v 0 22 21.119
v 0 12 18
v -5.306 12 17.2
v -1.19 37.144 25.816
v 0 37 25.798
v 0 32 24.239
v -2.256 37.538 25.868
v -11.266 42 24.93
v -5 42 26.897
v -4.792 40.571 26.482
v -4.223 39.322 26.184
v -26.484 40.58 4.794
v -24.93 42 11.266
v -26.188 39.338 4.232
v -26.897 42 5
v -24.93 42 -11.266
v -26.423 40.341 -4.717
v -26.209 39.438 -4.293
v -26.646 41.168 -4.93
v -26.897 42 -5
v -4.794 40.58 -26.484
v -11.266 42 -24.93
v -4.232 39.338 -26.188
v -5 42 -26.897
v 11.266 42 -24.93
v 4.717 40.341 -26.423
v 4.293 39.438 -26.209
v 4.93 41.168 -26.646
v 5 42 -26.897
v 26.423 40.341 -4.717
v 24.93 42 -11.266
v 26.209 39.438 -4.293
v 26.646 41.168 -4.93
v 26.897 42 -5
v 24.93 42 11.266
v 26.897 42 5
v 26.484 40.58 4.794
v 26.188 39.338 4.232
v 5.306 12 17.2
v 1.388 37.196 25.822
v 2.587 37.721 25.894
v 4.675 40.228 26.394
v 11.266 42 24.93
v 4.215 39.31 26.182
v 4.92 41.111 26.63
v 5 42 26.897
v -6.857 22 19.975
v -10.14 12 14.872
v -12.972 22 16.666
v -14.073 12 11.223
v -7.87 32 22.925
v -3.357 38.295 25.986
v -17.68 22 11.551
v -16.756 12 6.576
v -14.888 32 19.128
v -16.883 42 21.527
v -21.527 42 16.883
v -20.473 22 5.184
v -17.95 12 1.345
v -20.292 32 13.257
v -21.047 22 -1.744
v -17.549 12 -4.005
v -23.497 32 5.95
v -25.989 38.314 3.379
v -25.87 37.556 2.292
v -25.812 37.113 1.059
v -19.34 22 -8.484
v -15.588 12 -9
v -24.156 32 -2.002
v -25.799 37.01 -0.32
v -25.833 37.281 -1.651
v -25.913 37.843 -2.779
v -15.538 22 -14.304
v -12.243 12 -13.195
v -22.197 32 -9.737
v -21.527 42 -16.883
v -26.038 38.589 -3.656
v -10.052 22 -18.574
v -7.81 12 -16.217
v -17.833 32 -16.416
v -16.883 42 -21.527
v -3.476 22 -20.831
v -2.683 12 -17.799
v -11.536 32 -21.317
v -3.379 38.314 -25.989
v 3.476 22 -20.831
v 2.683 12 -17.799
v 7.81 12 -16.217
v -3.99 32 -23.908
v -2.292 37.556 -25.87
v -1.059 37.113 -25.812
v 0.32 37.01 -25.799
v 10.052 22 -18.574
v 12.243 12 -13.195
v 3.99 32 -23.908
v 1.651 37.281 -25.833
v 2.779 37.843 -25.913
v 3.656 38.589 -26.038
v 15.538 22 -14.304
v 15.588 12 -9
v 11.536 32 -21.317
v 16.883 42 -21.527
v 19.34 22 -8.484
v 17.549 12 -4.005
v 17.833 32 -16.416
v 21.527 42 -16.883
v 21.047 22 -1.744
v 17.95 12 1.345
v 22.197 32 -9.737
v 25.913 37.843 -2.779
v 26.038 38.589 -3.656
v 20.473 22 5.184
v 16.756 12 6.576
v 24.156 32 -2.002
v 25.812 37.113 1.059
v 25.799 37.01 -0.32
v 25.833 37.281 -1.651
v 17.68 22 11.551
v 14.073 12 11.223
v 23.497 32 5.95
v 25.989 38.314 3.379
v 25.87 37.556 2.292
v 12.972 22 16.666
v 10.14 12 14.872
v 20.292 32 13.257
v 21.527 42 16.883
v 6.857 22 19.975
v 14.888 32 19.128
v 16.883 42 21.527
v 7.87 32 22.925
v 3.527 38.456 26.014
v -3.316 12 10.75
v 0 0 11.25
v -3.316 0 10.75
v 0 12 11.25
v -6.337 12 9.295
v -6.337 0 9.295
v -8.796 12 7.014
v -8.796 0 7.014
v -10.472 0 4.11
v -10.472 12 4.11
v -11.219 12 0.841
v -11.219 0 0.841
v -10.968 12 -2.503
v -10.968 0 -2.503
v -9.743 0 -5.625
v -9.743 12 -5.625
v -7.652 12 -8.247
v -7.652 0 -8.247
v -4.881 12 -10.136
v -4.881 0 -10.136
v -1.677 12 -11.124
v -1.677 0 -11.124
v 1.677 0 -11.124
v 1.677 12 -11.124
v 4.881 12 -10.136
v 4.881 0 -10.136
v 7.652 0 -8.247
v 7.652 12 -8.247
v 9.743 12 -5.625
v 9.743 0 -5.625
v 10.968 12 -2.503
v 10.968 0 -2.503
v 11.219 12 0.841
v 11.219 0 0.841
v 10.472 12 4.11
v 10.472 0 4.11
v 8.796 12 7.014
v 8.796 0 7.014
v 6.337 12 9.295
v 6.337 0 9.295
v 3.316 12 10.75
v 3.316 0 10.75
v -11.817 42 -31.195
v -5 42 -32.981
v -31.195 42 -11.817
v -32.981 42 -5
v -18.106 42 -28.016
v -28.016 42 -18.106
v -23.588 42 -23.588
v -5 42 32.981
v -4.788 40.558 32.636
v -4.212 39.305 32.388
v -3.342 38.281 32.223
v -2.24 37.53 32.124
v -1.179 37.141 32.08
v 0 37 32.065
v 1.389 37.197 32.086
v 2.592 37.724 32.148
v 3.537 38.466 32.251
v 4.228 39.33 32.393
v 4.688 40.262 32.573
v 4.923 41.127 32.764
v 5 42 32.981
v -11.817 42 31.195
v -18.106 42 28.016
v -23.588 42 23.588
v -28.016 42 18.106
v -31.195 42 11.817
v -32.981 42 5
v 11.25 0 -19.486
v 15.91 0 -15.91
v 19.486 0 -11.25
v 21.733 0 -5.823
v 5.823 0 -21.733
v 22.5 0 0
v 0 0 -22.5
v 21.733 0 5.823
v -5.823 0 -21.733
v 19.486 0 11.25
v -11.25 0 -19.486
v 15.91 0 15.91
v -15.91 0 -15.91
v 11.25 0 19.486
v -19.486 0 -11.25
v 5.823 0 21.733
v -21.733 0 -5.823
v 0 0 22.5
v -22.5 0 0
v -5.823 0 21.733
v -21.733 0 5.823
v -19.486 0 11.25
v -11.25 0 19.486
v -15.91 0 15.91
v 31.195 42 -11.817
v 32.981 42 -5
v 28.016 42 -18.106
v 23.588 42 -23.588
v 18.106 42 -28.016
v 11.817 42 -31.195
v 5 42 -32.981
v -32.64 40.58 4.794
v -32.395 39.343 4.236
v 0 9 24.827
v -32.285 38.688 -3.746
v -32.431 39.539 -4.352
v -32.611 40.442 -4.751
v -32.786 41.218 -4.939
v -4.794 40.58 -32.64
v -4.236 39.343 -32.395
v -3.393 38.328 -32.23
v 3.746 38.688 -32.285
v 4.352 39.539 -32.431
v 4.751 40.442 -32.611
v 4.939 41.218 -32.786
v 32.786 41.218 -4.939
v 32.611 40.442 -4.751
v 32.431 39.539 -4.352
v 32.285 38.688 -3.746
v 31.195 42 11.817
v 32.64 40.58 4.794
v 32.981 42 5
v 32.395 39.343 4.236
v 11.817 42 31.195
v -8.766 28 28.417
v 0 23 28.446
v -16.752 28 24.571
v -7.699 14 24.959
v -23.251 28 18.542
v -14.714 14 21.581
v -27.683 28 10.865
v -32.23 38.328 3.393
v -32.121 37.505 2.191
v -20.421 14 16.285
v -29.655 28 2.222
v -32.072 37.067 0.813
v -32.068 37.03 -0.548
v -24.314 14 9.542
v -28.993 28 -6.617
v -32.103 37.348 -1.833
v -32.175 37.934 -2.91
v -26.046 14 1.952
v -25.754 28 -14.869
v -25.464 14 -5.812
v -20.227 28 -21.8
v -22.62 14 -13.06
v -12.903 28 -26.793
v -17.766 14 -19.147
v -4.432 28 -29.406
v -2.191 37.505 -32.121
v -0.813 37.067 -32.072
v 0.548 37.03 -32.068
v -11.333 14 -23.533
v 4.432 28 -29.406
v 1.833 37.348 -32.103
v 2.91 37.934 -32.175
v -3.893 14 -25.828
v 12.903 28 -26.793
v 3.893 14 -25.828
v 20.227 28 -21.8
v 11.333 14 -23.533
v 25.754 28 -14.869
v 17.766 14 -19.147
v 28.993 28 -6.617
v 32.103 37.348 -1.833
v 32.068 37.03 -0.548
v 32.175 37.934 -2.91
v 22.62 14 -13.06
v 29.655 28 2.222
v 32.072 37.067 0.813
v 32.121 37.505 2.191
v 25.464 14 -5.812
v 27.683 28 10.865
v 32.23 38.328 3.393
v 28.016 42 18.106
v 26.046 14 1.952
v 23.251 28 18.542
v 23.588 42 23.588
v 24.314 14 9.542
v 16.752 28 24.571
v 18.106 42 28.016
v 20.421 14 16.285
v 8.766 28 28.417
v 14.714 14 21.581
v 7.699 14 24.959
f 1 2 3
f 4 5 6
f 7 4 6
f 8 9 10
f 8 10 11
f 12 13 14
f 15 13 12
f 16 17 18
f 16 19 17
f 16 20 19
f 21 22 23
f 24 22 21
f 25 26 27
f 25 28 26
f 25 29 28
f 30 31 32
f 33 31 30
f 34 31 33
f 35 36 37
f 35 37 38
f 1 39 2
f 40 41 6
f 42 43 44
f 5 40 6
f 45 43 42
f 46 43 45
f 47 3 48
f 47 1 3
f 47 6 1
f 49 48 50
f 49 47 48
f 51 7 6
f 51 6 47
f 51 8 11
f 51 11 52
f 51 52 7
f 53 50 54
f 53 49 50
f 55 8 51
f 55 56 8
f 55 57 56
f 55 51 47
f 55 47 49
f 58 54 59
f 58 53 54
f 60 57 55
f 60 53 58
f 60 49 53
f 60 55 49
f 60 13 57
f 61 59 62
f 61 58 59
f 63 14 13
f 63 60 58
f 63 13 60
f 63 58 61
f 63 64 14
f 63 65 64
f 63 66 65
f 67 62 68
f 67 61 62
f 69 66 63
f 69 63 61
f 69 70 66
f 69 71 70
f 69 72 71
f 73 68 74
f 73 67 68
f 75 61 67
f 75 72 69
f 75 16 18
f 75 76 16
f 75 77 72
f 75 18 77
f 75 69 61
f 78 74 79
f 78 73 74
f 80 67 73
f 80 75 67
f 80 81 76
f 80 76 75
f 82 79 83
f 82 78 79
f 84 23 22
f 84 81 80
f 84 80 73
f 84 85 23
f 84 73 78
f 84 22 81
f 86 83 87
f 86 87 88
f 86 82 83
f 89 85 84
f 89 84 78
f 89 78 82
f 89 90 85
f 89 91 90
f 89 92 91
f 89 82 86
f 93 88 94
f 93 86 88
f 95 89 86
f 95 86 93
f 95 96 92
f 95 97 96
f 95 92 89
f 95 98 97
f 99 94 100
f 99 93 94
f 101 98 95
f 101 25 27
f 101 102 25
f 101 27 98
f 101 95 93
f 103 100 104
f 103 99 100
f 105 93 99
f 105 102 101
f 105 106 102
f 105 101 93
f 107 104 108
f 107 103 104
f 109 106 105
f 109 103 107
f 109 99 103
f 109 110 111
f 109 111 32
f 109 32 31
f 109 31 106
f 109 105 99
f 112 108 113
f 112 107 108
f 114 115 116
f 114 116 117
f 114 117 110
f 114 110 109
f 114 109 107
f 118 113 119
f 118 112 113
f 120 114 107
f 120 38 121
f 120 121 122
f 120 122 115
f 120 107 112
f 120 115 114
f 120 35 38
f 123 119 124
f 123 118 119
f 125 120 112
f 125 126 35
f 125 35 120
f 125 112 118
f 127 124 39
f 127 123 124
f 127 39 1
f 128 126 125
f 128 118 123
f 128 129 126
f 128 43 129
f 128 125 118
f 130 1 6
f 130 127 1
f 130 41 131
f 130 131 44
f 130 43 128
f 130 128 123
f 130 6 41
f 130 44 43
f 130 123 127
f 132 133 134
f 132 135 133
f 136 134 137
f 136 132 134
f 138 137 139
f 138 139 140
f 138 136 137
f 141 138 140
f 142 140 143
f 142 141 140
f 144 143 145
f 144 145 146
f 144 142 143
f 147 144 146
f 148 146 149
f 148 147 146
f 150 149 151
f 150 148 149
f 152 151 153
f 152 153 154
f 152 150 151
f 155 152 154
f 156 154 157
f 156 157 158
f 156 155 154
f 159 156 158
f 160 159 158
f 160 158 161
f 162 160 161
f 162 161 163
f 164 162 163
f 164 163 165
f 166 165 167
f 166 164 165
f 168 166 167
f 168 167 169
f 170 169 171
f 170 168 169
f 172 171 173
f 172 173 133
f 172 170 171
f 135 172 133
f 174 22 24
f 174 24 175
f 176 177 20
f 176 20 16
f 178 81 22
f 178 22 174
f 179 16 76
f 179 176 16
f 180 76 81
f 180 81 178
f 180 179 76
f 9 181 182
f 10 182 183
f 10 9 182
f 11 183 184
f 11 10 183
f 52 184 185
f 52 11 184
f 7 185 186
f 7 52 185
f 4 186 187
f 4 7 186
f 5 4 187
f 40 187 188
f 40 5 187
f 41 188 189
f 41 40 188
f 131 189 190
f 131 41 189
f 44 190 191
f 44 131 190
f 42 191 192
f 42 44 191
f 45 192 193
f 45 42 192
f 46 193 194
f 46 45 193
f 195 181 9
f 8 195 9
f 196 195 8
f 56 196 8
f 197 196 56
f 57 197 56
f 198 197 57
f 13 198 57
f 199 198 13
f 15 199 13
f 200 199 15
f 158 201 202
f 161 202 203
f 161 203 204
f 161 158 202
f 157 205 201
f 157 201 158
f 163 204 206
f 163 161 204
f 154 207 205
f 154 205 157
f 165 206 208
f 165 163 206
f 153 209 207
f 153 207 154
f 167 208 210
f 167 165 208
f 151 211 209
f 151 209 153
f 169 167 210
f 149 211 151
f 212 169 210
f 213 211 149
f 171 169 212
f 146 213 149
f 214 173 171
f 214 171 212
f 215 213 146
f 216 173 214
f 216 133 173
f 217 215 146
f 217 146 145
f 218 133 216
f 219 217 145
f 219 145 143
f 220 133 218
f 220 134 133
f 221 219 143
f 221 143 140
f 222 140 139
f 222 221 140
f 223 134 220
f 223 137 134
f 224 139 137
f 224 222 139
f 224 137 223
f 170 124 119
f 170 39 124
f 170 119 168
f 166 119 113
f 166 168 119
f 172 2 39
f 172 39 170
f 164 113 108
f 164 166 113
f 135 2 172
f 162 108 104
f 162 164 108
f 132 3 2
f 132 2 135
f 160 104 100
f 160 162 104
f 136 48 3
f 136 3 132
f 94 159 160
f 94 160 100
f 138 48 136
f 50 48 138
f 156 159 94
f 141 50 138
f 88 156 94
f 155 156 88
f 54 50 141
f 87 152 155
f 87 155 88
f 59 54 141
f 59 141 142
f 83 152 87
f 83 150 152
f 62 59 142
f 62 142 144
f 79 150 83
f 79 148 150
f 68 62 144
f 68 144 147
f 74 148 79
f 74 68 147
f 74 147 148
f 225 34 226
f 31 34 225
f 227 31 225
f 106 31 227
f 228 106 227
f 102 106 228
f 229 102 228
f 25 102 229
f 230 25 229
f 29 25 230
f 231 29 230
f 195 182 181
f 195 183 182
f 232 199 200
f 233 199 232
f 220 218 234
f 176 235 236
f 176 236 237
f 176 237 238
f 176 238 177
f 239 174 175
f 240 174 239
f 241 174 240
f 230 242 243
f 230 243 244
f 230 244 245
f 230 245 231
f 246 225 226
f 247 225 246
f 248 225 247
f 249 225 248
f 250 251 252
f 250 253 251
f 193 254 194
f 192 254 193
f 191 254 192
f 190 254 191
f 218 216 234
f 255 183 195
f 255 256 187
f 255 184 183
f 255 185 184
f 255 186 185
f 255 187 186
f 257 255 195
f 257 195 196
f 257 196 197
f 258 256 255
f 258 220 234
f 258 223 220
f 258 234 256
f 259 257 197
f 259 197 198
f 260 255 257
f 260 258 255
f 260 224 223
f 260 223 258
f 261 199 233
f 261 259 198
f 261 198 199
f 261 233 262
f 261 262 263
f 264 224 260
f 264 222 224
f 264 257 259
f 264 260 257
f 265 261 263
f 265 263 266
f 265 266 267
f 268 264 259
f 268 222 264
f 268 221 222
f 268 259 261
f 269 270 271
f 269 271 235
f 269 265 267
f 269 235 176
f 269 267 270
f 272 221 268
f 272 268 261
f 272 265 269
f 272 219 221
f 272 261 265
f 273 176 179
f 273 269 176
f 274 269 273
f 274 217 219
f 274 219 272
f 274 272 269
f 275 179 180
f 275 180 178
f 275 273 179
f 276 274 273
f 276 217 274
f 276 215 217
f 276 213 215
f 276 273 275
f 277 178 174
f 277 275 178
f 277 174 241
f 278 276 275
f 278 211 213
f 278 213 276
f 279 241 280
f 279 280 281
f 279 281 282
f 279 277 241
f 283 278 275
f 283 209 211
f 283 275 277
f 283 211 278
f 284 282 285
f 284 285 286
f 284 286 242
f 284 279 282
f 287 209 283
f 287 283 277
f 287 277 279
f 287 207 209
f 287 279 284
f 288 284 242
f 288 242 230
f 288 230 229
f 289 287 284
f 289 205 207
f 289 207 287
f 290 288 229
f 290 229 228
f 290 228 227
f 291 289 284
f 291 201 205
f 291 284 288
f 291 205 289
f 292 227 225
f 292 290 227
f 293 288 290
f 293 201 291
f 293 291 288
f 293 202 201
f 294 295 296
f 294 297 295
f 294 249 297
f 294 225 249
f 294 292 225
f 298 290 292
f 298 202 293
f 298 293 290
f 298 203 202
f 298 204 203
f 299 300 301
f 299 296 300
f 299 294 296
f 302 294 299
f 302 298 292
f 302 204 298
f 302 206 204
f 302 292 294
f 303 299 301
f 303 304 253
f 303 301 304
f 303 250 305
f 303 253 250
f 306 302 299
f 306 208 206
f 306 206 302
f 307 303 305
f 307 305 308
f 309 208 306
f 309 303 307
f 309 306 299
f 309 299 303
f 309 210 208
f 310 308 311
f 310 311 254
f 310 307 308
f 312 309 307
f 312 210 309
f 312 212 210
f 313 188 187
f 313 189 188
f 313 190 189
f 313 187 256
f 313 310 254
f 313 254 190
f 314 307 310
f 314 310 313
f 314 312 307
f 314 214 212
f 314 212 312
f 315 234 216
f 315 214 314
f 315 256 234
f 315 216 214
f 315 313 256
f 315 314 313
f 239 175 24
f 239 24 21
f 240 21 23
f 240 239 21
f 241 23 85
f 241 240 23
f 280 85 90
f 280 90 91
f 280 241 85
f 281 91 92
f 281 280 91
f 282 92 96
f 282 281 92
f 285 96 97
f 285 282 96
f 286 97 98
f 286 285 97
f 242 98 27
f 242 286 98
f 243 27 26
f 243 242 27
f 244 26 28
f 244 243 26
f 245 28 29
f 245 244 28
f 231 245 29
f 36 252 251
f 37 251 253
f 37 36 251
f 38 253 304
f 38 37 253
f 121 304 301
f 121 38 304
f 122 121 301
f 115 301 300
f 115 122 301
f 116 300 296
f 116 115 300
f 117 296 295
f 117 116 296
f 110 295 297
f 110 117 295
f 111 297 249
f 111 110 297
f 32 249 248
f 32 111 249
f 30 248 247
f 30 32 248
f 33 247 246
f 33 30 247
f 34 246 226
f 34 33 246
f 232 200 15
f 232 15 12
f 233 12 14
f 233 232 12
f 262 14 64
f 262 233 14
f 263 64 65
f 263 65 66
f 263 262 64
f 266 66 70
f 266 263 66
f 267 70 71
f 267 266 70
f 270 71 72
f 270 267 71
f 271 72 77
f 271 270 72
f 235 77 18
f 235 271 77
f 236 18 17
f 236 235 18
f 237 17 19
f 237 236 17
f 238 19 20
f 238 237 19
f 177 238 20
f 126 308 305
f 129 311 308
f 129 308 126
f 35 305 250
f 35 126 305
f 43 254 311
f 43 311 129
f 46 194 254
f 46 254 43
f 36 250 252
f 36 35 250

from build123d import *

# Parameters (mm, degrees)
CUT_EXTRUDE1_DEPTH      = 64.162373268
CUT_EXTRUDE1_DEPTH_BACK = 64.162373268
SKETCH2_R               = 5
CUT_EXTRUDE2_DEPTH      = 63.964159794
CUT_EXTRUDE2_DEPTH_BACK = 63.964159794
SKETCH3_R               = 5


with BuildPart() as part:
    # Sketch1 → Revolve1 (revolve)
    with BuildSketch(Plane.XY, mode=Mode.PRIVATE) as revolve1_sk:
        Polygon((11.25, 0), (11.25, 12), (18, 12), (27.357798165, 42), (33.357798165, 42), (22.5, 0), align=None)
    revolve(revolve1_sk.sketch.rotate(Axis((0, 40.458715596, 0), (0, -1, 0)), 90), axis=Axis((0, 40.458715596, 0), (0, -1, 0)))

    # Sketch2 → Cut-Extrude1 (cut, two sides: drawn at the far end of the back side and taken through both)
    with BuildSketch(Plane.XY.offset(-CUT_EXTRUDE1_DEPTH_BACK)):
        with Locations((0, 42)):
            Circle(SKETCH2_R)
    extrude(amount=CUT_EXTRUDE1_DEPTH + CUT_EXTRUDE1_DEPTH_BACK, mode=Mode.SUBTRACT)

    # Sketch3 → Cut-Extrude2 (cut, two sides: drawn at the far end of the back side and taken through both)
    with BuildSketch(Plane(origin=(0, 0, 0), x_dir=(0, 0, -1), z_dir=(1, 0, 0)).offset(-CUT_EXTRUDE2_DEPTH_BACK)):
        with Locations((0, 42)):
            Circle(SKETCH3_R)
    extrude(amount=CUT_EXTRUDE2_DEPTH + CUT_EXTRUDE2_DEPTH_BACK, mode=Mode.SUBTRACT)


solid = part.part
